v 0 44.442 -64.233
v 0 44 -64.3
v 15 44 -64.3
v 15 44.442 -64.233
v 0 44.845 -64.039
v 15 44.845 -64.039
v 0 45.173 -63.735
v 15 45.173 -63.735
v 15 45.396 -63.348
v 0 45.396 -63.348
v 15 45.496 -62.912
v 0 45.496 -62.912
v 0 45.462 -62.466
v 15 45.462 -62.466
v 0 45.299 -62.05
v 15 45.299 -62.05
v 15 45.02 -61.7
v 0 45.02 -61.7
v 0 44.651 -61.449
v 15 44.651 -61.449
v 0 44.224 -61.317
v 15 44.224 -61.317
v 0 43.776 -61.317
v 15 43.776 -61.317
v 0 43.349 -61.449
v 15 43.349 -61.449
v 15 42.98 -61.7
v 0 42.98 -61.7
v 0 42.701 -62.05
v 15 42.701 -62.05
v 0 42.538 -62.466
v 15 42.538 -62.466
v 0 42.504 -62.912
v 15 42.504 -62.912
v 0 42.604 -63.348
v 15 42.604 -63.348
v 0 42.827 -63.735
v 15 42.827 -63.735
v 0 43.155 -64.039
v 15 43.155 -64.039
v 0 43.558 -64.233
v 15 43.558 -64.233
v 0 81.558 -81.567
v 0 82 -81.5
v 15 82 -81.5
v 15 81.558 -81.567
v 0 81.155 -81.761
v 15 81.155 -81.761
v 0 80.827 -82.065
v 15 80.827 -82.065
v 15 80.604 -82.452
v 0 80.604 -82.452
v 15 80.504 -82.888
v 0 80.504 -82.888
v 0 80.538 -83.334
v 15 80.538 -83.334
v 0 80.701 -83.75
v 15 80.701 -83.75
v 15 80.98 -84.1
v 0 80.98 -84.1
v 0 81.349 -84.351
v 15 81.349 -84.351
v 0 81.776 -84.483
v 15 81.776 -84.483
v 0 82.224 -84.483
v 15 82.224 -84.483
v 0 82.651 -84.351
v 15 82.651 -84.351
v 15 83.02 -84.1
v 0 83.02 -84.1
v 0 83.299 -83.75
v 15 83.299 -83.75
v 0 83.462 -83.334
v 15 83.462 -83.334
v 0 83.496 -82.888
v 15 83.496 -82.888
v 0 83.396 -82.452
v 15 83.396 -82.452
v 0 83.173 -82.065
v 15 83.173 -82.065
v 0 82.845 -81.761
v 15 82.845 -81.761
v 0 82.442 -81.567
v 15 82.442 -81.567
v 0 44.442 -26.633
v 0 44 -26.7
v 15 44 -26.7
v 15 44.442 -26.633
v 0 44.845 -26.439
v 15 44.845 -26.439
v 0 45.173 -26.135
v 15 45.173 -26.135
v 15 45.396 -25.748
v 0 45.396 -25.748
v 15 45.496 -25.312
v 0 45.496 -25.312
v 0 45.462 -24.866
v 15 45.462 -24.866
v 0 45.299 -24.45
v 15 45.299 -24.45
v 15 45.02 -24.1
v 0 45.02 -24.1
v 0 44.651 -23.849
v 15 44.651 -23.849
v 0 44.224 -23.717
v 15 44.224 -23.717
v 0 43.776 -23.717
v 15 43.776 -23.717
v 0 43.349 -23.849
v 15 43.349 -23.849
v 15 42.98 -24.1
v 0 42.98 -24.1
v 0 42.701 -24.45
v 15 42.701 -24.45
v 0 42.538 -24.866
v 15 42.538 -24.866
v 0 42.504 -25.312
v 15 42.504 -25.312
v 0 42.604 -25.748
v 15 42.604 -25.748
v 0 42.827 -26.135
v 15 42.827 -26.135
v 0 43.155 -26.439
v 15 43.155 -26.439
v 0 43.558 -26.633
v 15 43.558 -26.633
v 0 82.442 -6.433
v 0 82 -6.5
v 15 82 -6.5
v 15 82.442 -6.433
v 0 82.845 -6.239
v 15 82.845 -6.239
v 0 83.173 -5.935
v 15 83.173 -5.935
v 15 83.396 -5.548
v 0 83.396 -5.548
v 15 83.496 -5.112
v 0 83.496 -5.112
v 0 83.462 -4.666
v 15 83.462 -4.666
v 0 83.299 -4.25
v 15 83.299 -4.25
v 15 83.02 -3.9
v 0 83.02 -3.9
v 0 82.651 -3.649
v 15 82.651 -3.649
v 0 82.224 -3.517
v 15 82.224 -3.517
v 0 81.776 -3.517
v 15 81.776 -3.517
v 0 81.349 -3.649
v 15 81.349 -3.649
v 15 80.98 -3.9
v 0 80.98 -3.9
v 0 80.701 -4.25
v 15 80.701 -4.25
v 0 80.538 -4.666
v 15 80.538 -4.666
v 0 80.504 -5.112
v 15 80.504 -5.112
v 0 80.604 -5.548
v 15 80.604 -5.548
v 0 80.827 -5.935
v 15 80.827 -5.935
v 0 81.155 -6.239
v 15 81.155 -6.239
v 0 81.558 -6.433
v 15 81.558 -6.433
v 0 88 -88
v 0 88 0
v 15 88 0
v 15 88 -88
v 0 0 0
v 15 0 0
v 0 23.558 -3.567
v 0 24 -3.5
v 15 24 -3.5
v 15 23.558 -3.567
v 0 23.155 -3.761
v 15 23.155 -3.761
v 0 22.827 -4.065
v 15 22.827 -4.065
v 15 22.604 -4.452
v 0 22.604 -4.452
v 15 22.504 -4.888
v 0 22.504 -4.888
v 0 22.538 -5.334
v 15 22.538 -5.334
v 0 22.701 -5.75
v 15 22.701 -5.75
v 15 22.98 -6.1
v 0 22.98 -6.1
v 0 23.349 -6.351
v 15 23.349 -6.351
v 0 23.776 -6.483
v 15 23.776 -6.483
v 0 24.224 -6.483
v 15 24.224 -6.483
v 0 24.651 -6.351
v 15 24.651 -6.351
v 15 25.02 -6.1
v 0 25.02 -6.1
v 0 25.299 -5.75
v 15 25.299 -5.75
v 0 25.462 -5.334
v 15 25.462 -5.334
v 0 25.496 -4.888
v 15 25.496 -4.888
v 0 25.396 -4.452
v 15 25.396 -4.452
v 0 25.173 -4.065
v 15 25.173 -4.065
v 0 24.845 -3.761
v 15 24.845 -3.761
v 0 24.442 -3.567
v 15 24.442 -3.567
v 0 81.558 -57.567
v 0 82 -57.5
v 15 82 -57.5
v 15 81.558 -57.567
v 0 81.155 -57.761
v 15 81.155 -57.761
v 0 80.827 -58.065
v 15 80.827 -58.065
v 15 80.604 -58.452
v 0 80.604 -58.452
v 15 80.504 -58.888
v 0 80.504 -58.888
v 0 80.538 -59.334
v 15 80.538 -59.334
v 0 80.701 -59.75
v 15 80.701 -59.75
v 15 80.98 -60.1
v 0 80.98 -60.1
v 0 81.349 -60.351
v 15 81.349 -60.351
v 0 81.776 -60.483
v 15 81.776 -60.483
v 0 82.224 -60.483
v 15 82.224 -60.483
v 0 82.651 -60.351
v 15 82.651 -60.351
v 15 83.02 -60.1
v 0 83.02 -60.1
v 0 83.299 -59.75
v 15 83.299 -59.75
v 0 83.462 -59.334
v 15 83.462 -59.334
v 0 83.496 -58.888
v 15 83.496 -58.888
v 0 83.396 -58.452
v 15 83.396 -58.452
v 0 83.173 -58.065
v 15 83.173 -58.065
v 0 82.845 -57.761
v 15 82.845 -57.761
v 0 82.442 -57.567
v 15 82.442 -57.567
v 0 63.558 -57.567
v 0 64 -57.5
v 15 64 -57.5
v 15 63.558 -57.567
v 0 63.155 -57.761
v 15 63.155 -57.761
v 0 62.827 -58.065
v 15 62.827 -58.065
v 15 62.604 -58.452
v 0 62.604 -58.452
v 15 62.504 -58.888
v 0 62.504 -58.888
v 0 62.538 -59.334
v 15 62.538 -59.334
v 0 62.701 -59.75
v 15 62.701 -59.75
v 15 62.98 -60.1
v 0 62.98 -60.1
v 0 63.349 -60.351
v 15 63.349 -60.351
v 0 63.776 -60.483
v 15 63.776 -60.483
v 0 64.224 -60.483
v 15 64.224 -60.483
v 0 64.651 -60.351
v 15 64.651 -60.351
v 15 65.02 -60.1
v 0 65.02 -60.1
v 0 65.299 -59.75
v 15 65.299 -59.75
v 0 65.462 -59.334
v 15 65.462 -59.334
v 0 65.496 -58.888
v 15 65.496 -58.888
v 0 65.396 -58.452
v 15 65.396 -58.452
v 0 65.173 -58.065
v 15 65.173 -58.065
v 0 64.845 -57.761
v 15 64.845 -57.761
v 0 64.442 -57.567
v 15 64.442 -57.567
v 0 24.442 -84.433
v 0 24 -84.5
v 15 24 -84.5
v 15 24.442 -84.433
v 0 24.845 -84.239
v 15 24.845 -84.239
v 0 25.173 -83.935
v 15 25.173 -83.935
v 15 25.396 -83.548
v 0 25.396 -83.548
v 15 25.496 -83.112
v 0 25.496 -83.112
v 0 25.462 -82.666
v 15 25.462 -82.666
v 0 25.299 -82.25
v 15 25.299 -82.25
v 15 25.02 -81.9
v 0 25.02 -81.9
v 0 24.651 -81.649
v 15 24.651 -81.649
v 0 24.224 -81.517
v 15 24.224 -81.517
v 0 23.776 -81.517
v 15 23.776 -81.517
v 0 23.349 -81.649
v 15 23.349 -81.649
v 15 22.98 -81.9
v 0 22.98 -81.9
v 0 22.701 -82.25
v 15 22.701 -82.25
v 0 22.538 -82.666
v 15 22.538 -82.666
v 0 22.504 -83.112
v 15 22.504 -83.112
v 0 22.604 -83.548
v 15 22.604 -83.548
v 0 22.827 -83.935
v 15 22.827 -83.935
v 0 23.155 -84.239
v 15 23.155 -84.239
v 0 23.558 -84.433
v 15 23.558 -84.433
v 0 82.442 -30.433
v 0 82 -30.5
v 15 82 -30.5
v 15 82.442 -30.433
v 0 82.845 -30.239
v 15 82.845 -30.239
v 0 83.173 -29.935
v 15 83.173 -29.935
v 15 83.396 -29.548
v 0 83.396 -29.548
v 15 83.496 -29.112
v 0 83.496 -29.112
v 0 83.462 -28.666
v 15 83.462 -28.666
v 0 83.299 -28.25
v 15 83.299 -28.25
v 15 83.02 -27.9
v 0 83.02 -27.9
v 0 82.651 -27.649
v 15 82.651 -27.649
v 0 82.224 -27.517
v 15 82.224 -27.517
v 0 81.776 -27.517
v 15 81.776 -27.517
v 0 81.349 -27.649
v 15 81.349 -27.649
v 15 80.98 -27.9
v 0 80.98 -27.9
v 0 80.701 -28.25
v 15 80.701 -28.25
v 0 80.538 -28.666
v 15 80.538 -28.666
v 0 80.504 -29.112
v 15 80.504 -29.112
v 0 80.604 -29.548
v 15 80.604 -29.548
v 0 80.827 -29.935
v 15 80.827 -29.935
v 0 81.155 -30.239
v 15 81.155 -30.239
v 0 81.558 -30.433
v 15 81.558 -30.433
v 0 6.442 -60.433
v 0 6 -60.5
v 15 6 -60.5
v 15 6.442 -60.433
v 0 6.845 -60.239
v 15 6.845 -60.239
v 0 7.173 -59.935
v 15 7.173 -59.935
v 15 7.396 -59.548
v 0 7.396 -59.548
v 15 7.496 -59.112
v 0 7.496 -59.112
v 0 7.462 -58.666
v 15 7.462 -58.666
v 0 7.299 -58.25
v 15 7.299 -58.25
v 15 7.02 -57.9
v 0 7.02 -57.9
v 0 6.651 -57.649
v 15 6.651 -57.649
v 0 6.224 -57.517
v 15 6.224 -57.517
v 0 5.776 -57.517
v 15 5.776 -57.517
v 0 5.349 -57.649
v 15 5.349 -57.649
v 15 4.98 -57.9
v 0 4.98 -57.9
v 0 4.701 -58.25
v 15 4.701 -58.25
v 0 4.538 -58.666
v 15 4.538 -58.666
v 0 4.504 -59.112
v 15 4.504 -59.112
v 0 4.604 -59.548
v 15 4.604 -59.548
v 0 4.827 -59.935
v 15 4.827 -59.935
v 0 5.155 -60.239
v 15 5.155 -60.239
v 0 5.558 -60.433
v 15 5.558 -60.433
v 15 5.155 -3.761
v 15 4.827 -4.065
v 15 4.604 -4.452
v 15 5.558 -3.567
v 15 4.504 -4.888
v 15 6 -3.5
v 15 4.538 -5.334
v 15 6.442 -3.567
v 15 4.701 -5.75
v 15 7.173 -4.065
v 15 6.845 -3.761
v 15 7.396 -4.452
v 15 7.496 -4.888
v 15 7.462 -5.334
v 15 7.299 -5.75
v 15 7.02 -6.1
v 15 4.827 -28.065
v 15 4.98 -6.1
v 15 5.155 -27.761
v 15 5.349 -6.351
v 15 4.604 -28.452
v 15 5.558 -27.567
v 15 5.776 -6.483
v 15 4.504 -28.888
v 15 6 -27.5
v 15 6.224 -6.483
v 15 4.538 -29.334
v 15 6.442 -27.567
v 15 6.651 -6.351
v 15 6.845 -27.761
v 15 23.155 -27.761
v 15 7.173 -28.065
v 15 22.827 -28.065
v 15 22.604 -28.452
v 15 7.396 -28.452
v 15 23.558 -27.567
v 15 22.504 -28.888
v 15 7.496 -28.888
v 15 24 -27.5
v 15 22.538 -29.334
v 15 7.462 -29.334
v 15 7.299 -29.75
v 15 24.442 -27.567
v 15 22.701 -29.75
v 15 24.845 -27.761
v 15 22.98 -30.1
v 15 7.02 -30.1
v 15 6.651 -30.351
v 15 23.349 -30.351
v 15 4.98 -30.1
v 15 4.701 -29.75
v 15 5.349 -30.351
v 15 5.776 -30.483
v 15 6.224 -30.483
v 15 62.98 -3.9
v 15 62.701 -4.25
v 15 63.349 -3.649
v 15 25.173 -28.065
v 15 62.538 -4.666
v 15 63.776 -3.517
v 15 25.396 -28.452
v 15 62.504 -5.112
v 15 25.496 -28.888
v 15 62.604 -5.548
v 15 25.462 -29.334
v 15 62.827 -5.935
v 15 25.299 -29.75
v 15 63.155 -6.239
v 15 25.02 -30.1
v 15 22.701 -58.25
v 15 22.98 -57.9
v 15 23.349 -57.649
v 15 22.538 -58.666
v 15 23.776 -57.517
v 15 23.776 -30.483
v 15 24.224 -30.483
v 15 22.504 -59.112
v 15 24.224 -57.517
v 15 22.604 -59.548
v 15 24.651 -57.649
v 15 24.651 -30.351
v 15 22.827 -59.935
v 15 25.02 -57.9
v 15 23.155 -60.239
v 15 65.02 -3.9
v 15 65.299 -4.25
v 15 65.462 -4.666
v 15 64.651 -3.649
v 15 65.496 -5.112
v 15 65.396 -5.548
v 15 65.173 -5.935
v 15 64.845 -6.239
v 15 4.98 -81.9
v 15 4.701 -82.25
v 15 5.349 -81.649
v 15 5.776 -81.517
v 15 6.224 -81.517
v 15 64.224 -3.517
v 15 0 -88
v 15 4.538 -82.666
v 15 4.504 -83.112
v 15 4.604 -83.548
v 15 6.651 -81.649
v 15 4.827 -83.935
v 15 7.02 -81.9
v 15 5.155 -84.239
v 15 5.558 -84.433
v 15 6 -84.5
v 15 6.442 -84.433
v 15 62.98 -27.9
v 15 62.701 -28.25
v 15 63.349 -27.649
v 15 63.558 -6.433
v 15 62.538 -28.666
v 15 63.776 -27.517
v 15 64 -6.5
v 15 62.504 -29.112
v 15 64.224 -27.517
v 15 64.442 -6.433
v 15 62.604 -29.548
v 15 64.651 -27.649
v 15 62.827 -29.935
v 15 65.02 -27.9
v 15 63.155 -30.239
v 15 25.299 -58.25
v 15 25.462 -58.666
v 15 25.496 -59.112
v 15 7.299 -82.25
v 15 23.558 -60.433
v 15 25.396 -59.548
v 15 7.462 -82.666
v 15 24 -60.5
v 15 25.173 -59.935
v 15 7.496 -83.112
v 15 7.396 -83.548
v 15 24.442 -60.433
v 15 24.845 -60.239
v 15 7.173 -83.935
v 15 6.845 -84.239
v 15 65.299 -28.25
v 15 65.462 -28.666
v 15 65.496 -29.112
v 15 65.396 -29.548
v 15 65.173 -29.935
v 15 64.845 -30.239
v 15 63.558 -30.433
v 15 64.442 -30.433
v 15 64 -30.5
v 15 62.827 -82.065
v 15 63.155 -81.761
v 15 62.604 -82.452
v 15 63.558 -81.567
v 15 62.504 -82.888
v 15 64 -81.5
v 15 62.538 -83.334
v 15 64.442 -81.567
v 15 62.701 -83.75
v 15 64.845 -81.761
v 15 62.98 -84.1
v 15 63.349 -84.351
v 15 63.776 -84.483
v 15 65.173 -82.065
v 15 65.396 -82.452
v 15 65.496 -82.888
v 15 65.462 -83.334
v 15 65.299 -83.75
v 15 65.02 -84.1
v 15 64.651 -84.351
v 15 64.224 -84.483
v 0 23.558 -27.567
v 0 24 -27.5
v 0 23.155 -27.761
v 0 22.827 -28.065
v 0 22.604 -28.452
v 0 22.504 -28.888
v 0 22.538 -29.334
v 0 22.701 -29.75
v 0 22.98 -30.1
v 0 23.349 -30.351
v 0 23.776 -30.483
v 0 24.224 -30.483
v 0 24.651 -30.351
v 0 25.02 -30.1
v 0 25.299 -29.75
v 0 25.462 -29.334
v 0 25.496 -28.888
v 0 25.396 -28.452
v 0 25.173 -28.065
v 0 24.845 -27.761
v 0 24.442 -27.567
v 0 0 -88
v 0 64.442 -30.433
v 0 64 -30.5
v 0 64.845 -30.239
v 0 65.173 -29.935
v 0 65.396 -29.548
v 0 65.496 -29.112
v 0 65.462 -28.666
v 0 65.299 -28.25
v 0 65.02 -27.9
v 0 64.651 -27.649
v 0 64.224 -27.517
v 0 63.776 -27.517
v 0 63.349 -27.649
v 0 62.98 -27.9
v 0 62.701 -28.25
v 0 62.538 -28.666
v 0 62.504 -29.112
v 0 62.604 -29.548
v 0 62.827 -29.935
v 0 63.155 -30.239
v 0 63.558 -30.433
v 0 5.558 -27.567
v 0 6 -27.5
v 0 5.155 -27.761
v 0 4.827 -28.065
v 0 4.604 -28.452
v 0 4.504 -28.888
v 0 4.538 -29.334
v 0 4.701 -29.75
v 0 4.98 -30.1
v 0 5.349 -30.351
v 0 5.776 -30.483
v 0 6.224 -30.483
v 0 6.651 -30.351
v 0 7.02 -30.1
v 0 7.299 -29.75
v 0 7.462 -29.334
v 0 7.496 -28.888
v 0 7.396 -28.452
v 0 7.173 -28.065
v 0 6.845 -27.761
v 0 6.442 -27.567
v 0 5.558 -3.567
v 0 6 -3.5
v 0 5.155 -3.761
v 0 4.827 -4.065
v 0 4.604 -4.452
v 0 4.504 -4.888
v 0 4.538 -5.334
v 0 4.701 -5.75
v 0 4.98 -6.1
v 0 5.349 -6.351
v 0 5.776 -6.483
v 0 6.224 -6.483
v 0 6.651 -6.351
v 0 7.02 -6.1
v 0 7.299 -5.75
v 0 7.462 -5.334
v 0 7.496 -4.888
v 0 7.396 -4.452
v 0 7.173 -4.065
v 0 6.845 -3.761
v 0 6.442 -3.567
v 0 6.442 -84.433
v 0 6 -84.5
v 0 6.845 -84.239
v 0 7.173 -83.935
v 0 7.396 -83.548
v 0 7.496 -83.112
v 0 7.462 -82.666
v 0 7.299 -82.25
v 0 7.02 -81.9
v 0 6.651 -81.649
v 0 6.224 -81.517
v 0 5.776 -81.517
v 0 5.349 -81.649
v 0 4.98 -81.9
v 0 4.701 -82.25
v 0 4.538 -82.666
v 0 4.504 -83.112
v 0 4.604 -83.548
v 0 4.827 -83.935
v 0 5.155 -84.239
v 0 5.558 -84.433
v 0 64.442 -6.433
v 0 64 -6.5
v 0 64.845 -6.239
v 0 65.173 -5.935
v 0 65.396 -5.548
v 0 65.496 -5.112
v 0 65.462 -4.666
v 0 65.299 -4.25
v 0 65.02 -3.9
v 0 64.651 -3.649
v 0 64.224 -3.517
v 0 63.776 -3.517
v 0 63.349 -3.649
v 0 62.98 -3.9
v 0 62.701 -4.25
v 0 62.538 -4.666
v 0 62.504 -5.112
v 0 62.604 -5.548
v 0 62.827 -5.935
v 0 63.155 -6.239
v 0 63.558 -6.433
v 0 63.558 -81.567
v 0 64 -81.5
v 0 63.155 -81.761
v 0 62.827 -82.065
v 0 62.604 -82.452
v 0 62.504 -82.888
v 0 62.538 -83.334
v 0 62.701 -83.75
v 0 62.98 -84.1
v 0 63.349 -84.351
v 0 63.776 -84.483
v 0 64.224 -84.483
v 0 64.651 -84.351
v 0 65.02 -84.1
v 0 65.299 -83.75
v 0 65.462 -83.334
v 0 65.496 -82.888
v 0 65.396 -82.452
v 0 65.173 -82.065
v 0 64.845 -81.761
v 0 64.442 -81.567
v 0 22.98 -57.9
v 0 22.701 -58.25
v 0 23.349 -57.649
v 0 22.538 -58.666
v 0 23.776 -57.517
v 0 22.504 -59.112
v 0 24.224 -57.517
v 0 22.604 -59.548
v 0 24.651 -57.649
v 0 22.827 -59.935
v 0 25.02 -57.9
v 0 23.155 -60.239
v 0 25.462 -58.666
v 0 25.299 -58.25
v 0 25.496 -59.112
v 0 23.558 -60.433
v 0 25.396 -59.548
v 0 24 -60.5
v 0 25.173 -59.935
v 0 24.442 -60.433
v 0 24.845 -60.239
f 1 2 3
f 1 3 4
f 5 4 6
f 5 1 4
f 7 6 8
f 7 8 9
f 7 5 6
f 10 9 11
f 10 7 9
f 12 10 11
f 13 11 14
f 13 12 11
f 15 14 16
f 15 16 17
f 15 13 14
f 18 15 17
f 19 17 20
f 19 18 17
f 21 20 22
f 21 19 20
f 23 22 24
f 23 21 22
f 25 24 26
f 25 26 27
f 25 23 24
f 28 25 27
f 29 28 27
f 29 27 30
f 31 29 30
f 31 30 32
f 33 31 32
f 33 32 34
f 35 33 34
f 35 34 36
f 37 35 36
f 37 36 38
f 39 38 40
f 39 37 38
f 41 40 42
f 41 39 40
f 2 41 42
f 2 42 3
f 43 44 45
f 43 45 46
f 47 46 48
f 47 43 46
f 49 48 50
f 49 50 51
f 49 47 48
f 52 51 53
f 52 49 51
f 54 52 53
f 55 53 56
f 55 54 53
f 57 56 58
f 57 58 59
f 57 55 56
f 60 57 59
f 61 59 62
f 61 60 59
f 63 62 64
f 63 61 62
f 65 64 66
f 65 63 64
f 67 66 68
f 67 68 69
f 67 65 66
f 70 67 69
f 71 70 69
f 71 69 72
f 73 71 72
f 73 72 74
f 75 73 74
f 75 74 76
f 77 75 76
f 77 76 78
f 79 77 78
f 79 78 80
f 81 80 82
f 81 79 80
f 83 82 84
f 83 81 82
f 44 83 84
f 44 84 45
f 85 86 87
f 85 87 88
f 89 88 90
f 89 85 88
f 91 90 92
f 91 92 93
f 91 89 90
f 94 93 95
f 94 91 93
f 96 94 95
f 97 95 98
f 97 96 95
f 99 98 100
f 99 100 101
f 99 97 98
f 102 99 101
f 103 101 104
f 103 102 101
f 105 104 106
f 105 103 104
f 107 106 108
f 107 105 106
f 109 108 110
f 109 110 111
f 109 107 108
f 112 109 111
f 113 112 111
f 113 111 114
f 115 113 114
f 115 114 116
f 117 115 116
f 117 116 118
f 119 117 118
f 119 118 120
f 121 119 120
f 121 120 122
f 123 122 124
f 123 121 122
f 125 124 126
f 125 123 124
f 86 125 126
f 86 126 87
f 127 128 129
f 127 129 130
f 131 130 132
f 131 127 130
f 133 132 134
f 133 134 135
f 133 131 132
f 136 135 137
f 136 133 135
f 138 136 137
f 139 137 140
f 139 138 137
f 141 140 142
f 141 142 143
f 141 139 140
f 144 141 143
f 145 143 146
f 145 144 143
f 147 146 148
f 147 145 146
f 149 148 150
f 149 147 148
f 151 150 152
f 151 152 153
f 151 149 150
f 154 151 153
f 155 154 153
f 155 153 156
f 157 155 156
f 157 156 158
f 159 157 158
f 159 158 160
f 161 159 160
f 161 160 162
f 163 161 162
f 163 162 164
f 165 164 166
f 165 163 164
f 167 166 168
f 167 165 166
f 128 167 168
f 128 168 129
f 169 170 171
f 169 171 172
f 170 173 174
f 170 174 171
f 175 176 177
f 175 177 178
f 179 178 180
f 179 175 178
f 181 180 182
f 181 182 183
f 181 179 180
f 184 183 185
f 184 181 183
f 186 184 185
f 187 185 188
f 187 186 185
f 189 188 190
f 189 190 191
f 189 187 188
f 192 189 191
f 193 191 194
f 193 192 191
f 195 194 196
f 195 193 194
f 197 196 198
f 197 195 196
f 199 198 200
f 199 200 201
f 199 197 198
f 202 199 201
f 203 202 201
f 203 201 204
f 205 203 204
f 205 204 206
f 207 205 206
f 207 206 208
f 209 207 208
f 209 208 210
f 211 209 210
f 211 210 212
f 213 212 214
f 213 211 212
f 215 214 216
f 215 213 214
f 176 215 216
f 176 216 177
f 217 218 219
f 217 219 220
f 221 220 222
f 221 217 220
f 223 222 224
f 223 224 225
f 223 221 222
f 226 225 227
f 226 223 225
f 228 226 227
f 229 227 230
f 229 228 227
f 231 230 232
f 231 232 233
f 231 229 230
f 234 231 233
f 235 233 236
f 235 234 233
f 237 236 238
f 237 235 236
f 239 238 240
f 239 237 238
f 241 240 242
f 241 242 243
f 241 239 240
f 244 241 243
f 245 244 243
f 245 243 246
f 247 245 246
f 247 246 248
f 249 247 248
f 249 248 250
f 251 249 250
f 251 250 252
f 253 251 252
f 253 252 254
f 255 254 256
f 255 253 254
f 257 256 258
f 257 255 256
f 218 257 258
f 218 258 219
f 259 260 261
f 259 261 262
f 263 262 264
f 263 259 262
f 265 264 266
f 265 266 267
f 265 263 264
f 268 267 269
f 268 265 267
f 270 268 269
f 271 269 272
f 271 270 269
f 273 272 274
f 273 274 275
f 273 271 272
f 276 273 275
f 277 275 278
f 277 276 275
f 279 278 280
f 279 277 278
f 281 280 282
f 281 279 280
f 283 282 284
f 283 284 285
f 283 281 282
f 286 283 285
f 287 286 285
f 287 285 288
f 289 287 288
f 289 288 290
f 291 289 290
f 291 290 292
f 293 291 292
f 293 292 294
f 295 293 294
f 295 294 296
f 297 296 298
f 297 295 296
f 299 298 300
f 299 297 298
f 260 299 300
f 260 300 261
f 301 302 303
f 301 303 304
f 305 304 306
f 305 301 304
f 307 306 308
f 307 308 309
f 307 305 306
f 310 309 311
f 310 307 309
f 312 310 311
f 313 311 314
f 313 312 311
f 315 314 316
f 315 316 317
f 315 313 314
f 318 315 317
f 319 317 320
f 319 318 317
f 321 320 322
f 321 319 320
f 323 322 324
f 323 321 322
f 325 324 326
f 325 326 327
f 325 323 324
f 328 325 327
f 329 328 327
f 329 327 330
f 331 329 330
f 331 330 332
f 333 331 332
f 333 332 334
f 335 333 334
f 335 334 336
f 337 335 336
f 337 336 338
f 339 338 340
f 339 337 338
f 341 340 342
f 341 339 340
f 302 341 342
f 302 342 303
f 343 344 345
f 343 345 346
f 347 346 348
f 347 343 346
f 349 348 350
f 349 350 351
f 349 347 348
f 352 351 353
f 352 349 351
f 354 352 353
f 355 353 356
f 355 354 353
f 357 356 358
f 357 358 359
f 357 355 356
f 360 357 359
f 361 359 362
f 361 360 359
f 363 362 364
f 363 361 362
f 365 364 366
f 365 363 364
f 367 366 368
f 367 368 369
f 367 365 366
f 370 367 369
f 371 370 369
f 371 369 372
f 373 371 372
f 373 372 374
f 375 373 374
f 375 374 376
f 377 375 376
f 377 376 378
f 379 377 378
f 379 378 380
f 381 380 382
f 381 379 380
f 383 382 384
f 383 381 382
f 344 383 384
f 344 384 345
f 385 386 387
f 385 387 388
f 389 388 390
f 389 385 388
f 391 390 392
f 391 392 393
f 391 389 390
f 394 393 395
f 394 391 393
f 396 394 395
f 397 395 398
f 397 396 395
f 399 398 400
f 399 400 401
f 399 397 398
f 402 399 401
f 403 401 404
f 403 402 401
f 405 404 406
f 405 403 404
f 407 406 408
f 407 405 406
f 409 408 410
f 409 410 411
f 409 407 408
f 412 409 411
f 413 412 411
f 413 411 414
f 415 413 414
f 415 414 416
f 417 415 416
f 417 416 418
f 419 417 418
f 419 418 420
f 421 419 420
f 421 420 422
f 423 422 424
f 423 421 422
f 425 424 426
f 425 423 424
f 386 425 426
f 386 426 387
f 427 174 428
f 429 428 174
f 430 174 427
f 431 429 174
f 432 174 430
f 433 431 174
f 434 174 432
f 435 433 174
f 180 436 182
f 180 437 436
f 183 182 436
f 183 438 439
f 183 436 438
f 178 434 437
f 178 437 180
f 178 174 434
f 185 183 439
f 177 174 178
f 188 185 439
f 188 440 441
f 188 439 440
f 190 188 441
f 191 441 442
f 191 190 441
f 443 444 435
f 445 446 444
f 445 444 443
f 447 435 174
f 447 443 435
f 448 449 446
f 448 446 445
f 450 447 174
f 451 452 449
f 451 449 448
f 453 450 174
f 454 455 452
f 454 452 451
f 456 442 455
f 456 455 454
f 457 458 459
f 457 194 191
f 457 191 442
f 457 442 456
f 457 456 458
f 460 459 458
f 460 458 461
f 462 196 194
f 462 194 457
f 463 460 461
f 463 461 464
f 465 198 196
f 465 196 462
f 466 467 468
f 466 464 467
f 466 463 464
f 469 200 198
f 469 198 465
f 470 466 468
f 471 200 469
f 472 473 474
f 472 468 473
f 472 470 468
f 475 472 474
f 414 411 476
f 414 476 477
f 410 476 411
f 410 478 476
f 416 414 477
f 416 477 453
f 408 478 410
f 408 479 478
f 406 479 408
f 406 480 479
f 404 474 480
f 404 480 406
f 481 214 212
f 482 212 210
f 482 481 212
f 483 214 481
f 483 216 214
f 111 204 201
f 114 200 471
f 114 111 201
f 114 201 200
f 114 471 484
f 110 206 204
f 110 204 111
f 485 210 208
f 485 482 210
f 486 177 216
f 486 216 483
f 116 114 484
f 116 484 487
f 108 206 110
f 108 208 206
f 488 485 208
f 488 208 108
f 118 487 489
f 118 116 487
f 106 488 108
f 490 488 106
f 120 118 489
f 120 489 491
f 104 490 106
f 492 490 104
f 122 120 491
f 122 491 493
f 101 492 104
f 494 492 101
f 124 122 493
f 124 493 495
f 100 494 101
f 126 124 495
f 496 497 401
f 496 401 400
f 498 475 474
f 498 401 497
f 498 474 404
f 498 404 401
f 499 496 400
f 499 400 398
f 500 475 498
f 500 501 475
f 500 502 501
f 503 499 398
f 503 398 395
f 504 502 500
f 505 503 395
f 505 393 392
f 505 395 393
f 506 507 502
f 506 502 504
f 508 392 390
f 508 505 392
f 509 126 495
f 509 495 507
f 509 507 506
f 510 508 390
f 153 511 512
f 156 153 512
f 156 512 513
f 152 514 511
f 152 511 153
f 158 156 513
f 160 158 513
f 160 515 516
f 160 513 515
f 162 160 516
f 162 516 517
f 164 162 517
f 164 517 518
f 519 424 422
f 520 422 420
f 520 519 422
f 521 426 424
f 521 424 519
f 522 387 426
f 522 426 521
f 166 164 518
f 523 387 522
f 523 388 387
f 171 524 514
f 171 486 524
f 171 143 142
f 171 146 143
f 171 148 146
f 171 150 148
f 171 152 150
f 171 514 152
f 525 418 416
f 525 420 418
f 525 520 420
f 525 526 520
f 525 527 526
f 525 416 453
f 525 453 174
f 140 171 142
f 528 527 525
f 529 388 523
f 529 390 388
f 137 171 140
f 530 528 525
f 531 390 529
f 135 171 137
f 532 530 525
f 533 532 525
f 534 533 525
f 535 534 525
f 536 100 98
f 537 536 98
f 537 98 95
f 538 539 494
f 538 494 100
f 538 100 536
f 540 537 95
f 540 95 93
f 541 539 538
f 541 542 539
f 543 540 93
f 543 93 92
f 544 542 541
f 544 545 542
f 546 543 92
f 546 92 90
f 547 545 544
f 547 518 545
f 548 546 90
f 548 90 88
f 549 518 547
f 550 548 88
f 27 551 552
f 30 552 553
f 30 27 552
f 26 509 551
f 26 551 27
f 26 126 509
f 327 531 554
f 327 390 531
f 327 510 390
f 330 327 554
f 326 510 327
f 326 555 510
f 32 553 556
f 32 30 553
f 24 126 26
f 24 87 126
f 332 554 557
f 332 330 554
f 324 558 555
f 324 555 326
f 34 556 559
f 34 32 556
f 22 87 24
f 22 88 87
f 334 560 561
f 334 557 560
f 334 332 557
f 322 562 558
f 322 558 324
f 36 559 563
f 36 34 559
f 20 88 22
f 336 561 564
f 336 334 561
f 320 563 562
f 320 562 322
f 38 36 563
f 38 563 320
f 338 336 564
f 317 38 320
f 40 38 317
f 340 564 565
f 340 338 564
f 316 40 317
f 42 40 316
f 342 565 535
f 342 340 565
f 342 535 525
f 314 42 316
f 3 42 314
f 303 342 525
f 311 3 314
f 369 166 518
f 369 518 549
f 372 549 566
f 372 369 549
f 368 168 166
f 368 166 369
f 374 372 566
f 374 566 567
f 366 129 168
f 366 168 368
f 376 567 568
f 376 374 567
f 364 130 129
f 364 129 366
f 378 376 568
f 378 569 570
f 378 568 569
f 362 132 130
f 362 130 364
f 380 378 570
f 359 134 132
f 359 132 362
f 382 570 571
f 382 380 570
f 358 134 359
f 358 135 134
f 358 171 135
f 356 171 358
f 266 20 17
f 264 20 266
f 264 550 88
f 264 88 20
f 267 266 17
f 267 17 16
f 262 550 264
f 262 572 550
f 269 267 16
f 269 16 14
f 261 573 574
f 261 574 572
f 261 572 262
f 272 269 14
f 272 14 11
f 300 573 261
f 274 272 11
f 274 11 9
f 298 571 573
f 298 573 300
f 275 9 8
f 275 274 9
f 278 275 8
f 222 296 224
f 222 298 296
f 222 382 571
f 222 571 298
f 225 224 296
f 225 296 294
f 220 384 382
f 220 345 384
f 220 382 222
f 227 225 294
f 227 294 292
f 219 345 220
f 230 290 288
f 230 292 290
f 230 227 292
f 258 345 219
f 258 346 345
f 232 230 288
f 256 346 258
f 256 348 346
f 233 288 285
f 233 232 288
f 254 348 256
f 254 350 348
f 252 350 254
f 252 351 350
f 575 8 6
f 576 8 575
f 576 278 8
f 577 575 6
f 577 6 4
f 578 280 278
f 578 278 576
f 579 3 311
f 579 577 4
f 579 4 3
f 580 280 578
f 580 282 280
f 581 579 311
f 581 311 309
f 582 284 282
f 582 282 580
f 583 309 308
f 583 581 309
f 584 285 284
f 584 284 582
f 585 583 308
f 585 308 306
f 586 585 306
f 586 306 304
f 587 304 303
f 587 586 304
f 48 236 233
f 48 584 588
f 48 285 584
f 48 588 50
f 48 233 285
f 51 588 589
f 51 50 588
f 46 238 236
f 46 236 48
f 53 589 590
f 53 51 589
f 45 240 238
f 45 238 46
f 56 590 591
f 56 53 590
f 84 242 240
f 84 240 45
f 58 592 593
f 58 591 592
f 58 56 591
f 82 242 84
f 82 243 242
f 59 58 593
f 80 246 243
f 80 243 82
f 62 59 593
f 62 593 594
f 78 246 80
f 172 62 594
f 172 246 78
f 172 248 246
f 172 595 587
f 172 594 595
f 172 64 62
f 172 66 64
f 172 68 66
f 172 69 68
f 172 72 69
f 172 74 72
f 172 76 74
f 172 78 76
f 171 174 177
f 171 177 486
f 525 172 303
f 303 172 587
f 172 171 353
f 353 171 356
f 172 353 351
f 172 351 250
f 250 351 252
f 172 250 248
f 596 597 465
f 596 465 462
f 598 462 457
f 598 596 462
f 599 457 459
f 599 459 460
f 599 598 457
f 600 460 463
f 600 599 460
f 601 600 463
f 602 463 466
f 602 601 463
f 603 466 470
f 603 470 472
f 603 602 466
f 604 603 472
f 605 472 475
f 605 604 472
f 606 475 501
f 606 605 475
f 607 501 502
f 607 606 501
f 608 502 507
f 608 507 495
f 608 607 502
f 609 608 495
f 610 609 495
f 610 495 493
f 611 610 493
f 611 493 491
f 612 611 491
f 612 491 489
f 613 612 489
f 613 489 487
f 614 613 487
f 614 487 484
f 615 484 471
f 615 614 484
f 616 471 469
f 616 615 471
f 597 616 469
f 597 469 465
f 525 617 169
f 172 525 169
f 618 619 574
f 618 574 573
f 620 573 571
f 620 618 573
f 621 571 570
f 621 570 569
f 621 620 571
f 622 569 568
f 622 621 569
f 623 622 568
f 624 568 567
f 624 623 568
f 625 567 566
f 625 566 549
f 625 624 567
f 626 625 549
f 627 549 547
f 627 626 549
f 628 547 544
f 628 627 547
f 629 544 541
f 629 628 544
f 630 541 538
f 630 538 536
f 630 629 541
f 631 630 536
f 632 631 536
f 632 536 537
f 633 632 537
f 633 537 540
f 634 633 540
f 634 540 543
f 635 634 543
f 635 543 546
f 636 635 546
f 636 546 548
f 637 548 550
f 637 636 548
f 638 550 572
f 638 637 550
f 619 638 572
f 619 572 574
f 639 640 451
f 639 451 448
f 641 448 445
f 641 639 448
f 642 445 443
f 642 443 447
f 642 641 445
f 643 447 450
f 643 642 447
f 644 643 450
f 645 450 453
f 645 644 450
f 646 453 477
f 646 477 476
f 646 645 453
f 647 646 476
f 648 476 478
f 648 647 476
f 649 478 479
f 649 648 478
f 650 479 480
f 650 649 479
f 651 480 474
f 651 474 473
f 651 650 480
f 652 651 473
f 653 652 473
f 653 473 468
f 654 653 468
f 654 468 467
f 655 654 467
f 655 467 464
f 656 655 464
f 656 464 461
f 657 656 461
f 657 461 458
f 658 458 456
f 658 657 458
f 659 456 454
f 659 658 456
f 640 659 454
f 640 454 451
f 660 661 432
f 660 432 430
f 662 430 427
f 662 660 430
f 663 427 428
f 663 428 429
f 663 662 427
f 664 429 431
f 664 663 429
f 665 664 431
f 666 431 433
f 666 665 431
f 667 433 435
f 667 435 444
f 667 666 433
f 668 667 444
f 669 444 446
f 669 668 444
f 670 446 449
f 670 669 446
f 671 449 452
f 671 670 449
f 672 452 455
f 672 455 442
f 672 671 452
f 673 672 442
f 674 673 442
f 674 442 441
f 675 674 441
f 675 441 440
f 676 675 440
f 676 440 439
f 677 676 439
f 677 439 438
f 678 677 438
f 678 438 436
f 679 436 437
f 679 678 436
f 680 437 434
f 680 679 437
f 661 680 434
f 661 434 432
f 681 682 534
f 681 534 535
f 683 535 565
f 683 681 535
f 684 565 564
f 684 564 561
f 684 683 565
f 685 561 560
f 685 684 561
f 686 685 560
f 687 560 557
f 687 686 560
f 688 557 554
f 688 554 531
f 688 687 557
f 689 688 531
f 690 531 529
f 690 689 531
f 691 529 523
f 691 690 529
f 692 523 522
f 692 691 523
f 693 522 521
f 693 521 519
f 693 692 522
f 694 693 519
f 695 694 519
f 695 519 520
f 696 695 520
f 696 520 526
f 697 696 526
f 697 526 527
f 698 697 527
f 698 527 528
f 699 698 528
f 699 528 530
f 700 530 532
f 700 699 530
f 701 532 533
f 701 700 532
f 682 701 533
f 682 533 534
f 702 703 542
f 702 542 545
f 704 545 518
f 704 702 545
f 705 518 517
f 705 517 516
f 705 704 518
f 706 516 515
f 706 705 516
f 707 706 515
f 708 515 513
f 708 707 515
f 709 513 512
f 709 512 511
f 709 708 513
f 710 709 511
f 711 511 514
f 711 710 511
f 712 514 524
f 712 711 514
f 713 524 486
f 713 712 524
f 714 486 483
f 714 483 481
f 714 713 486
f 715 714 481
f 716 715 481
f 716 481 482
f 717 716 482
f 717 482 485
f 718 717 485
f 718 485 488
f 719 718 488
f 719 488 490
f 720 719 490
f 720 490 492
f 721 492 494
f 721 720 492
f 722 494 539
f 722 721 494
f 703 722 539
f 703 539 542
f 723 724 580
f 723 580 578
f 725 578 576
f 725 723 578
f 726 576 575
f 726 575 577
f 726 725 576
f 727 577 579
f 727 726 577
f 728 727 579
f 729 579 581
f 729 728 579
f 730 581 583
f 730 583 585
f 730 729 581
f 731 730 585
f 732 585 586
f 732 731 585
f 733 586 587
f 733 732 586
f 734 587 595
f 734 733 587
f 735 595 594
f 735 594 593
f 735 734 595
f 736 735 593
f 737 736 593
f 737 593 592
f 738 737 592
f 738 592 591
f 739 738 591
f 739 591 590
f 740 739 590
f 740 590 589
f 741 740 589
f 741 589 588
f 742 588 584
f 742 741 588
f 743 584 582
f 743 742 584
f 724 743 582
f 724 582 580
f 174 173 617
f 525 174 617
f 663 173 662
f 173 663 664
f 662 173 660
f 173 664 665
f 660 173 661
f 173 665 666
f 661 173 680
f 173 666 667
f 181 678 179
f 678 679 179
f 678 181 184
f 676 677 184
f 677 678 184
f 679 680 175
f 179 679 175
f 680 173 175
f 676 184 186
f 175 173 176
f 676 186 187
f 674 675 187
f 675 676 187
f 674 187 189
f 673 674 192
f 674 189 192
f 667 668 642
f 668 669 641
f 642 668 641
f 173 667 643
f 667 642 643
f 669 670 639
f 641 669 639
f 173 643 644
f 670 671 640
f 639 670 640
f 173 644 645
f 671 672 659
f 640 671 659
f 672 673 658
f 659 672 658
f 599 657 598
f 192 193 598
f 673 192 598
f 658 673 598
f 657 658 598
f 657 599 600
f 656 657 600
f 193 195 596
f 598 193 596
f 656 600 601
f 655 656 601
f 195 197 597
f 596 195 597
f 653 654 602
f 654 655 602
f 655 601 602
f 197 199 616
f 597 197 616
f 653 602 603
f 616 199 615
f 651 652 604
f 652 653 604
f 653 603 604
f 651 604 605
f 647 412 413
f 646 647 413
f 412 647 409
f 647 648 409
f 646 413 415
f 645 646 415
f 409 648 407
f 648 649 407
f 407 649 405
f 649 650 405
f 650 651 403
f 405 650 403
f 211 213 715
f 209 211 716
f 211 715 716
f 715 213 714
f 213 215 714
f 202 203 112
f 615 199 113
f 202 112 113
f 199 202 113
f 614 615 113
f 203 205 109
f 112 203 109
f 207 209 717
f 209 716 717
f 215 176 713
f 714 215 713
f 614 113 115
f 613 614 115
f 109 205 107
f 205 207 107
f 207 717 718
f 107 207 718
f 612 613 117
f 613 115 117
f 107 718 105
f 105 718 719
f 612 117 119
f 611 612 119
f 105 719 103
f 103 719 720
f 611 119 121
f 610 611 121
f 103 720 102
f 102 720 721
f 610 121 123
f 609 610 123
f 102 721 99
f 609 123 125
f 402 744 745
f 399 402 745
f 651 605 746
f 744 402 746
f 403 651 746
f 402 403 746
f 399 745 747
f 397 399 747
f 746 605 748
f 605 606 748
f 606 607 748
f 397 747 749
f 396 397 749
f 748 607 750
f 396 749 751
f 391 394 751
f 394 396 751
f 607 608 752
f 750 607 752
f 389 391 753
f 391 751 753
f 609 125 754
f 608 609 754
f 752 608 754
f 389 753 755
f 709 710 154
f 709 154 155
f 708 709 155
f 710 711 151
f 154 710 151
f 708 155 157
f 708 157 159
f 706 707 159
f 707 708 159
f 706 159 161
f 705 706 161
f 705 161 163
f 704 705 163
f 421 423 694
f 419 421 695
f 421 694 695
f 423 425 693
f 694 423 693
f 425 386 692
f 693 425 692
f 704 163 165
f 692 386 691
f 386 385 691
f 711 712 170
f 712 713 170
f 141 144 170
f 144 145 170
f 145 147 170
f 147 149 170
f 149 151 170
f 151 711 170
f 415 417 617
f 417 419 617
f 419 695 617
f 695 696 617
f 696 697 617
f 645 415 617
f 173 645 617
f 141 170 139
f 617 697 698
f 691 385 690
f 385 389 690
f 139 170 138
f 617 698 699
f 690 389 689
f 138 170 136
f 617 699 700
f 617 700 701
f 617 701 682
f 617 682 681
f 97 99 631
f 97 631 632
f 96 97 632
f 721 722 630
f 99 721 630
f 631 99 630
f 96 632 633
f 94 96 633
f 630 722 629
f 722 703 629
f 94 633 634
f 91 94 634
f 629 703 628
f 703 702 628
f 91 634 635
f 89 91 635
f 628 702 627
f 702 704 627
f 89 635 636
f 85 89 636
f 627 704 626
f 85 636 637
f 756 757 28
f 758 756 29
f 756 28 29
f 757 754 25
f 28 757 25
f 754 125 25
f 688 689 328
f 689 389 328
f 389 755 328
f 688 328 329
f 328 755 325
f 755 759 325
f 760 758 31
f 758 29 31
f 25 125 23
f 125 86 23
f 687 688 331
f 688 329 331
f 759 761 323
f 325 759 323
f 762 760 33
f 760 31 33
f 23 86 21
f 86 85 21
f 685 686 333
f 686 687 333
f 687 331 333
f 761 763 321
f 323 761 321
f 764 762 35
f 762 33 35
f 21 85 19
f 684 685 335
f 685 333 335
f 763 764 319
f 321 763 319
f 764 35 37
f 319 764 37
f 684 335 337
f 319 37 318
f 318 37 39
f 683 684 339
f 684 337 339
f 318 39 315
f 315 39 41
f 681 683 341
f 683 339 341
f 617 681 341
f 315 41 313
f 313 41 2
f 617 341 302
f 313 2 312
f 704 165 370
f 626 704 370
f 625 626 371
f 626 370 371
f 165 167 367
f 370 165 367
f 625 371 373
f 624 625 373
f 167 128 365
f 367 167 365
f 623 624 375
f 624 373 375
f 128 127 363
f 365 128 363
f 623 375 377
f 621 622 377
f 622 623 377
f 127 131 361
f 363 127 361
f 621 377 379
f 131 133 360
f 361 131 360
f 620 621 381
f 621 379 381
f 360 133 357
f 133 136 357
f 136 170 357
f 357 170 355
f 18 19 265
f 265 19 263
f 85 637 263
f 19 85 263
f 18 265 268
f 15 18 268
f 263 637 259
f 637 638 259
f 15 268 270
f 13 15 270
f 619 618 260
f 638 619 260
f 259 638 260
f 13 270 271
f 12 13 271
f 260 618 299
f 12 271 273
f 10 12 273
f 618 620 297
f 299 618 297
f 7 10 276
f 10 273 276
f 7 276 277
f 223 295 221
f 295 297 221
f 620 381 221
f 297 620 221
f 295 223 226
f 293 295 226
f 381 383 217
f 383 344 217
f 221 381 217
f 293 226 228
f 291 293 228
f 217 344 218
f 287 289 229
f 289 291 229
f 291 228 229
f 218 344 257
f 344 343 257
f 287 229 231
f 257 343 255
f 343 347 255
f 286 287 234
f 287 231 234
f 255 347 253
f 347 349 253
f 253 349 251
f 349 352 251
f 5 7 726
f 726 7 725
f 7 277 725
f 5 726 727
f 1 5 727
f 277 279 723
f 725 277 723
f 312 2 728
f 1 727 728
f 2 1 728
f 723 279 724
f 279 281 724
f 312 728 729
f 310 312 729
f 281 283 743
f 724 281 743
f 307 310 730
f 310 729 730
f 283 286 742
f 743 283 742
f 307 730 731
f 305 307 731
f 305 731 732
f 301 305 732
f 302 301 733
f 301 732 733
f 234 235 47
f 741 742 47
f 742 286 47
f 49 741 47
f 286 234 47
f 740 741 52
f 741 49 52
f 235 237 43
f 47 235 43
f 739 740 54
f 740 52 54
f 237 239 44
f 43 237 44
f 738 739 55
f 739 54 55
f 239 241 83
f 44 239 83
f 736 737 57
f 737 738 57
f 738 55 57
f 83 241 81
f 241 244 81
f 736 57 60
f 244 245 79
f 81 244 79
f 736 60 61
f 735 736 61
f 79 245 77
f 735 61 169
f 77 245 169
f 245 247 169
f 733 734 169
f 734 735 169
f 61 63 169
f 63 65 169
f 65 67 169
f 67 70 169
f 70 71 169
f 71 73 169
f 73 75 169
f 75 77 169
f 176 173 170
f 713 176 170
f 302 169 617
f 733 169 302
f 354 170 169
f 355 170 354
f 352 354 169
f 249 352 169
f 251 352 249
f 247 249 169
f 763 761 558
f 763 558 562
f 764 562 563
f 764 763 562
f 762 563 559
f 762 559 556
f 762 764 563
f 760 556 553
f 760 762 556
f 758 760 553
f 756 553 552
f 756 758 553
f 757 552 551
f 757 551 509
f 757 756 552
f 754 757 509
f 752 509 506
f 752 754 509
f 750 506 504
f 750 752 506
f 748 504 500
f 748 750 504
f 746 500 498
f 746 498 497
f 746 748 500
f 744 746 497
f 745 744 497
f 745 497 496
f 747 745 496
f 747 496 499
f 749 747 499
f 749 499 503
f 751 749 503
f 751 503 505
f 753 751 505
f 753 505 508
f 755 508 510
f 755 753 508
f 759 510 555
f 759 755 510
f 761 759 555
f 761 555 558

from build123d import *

# Parameters (mm, degrees)
CROQUIS1_W              = 88
CROQUIS1_H              = 88
CROQUIS1_R              = 1.5
SALIENTE_EXTRUIR1_DEPTH = 15


with BuildPart() as part:
    # Croquis1 → Saliente-Extruir1 (new body)
    with BuildSketch(Plane(origin=(0, 0, 0), x_dir=(0, 0, -1), z_dir=(1, 0, 0))):
        with Locations((44, 44)):
            Rectangle(CROQUIS1_W, CROQUIS1_H)
        with Locations((5, 82)):
            Circle(CROQUIS1_R, mode=Mode.SUBTRACT)
        with Locations((29, 82)):
            Circle(CROQUIS1_R, mode=Mode.SUBTRACT)
        with Locations((29, 64)):
            Circle(CROQUIS1_R, mode=Mode.SUBTRACT)
        with Locations((5, 64)):
            Circle(CROQUIS1_R, mode=Mode.SUBTRACT)
        with Locations(Location((59, 64, 0), (0, 0, 180))):
            Circle(CROQUIS1_R, mode=Mode.SUBTRACT)
        with Locations(Location((59, 82, 0), (0, 0, 180))):
            Circle(CROQUIS1_R, mode=Mode.SUBTRACT)
        with Locations(Location((83, 64, 0), (0, 0, 180))):
            Circle(CROQUIS1_R, mode=Mode.SUBTRACT)
        with Locations(Location((83, 82, 0), (0, 0, 180))):
            Circle(CROQUIS1_R, mode=Mode.SUBTRACT)
        with Locations((83, 24)):
            Circle(CROQUIS1_R, mode=Mode.SUBTRACT)
        with Locations((59, 24)):
            Circle(CROQUIS1_R, mode=Mode.SUBTRACT)
        with Locations((83, 6)):
            Circle(CROQUIS1_R, mode=Mode.SUBTRACT)
        with Locations((59, 6)):
            Circle(CROQUIS1_R, mode=Mode.SUBTRACT)
        with Locations(Location((29, 24, 0), (0, 0, 180))):
            Circle(CROQUIS1_R, mode=Mode.SUBTRACT)
        with Locations(Location((5, 24, 0), (0, 0, 180))):
            Circle(CROQUIS1_R, mode=Mode.SUBTRACT)
        with Locations(Location((29, 6, 0), (0, 0, 180))):
            Circle(CROQUIS1_R, mode=Mode.SUBTRACT)
        with Locations(Location((5, 6, 0), (0, 0, 180))):
            Circle(CROQUIS1_R, mode=Mode.SUBTRACT)
        with Locations((25.2, 44)):
            Circle(CROQUIS1_R, mode=Mode.SUBTRACT)
        with Locations((62.8, 44)):
            Circle(CROQUIS1_R, mode=Mode.SUBTRACT)
    extrude(amount=SALIENTE_EXTRUIR1_DEPTH)


solid = part.part
